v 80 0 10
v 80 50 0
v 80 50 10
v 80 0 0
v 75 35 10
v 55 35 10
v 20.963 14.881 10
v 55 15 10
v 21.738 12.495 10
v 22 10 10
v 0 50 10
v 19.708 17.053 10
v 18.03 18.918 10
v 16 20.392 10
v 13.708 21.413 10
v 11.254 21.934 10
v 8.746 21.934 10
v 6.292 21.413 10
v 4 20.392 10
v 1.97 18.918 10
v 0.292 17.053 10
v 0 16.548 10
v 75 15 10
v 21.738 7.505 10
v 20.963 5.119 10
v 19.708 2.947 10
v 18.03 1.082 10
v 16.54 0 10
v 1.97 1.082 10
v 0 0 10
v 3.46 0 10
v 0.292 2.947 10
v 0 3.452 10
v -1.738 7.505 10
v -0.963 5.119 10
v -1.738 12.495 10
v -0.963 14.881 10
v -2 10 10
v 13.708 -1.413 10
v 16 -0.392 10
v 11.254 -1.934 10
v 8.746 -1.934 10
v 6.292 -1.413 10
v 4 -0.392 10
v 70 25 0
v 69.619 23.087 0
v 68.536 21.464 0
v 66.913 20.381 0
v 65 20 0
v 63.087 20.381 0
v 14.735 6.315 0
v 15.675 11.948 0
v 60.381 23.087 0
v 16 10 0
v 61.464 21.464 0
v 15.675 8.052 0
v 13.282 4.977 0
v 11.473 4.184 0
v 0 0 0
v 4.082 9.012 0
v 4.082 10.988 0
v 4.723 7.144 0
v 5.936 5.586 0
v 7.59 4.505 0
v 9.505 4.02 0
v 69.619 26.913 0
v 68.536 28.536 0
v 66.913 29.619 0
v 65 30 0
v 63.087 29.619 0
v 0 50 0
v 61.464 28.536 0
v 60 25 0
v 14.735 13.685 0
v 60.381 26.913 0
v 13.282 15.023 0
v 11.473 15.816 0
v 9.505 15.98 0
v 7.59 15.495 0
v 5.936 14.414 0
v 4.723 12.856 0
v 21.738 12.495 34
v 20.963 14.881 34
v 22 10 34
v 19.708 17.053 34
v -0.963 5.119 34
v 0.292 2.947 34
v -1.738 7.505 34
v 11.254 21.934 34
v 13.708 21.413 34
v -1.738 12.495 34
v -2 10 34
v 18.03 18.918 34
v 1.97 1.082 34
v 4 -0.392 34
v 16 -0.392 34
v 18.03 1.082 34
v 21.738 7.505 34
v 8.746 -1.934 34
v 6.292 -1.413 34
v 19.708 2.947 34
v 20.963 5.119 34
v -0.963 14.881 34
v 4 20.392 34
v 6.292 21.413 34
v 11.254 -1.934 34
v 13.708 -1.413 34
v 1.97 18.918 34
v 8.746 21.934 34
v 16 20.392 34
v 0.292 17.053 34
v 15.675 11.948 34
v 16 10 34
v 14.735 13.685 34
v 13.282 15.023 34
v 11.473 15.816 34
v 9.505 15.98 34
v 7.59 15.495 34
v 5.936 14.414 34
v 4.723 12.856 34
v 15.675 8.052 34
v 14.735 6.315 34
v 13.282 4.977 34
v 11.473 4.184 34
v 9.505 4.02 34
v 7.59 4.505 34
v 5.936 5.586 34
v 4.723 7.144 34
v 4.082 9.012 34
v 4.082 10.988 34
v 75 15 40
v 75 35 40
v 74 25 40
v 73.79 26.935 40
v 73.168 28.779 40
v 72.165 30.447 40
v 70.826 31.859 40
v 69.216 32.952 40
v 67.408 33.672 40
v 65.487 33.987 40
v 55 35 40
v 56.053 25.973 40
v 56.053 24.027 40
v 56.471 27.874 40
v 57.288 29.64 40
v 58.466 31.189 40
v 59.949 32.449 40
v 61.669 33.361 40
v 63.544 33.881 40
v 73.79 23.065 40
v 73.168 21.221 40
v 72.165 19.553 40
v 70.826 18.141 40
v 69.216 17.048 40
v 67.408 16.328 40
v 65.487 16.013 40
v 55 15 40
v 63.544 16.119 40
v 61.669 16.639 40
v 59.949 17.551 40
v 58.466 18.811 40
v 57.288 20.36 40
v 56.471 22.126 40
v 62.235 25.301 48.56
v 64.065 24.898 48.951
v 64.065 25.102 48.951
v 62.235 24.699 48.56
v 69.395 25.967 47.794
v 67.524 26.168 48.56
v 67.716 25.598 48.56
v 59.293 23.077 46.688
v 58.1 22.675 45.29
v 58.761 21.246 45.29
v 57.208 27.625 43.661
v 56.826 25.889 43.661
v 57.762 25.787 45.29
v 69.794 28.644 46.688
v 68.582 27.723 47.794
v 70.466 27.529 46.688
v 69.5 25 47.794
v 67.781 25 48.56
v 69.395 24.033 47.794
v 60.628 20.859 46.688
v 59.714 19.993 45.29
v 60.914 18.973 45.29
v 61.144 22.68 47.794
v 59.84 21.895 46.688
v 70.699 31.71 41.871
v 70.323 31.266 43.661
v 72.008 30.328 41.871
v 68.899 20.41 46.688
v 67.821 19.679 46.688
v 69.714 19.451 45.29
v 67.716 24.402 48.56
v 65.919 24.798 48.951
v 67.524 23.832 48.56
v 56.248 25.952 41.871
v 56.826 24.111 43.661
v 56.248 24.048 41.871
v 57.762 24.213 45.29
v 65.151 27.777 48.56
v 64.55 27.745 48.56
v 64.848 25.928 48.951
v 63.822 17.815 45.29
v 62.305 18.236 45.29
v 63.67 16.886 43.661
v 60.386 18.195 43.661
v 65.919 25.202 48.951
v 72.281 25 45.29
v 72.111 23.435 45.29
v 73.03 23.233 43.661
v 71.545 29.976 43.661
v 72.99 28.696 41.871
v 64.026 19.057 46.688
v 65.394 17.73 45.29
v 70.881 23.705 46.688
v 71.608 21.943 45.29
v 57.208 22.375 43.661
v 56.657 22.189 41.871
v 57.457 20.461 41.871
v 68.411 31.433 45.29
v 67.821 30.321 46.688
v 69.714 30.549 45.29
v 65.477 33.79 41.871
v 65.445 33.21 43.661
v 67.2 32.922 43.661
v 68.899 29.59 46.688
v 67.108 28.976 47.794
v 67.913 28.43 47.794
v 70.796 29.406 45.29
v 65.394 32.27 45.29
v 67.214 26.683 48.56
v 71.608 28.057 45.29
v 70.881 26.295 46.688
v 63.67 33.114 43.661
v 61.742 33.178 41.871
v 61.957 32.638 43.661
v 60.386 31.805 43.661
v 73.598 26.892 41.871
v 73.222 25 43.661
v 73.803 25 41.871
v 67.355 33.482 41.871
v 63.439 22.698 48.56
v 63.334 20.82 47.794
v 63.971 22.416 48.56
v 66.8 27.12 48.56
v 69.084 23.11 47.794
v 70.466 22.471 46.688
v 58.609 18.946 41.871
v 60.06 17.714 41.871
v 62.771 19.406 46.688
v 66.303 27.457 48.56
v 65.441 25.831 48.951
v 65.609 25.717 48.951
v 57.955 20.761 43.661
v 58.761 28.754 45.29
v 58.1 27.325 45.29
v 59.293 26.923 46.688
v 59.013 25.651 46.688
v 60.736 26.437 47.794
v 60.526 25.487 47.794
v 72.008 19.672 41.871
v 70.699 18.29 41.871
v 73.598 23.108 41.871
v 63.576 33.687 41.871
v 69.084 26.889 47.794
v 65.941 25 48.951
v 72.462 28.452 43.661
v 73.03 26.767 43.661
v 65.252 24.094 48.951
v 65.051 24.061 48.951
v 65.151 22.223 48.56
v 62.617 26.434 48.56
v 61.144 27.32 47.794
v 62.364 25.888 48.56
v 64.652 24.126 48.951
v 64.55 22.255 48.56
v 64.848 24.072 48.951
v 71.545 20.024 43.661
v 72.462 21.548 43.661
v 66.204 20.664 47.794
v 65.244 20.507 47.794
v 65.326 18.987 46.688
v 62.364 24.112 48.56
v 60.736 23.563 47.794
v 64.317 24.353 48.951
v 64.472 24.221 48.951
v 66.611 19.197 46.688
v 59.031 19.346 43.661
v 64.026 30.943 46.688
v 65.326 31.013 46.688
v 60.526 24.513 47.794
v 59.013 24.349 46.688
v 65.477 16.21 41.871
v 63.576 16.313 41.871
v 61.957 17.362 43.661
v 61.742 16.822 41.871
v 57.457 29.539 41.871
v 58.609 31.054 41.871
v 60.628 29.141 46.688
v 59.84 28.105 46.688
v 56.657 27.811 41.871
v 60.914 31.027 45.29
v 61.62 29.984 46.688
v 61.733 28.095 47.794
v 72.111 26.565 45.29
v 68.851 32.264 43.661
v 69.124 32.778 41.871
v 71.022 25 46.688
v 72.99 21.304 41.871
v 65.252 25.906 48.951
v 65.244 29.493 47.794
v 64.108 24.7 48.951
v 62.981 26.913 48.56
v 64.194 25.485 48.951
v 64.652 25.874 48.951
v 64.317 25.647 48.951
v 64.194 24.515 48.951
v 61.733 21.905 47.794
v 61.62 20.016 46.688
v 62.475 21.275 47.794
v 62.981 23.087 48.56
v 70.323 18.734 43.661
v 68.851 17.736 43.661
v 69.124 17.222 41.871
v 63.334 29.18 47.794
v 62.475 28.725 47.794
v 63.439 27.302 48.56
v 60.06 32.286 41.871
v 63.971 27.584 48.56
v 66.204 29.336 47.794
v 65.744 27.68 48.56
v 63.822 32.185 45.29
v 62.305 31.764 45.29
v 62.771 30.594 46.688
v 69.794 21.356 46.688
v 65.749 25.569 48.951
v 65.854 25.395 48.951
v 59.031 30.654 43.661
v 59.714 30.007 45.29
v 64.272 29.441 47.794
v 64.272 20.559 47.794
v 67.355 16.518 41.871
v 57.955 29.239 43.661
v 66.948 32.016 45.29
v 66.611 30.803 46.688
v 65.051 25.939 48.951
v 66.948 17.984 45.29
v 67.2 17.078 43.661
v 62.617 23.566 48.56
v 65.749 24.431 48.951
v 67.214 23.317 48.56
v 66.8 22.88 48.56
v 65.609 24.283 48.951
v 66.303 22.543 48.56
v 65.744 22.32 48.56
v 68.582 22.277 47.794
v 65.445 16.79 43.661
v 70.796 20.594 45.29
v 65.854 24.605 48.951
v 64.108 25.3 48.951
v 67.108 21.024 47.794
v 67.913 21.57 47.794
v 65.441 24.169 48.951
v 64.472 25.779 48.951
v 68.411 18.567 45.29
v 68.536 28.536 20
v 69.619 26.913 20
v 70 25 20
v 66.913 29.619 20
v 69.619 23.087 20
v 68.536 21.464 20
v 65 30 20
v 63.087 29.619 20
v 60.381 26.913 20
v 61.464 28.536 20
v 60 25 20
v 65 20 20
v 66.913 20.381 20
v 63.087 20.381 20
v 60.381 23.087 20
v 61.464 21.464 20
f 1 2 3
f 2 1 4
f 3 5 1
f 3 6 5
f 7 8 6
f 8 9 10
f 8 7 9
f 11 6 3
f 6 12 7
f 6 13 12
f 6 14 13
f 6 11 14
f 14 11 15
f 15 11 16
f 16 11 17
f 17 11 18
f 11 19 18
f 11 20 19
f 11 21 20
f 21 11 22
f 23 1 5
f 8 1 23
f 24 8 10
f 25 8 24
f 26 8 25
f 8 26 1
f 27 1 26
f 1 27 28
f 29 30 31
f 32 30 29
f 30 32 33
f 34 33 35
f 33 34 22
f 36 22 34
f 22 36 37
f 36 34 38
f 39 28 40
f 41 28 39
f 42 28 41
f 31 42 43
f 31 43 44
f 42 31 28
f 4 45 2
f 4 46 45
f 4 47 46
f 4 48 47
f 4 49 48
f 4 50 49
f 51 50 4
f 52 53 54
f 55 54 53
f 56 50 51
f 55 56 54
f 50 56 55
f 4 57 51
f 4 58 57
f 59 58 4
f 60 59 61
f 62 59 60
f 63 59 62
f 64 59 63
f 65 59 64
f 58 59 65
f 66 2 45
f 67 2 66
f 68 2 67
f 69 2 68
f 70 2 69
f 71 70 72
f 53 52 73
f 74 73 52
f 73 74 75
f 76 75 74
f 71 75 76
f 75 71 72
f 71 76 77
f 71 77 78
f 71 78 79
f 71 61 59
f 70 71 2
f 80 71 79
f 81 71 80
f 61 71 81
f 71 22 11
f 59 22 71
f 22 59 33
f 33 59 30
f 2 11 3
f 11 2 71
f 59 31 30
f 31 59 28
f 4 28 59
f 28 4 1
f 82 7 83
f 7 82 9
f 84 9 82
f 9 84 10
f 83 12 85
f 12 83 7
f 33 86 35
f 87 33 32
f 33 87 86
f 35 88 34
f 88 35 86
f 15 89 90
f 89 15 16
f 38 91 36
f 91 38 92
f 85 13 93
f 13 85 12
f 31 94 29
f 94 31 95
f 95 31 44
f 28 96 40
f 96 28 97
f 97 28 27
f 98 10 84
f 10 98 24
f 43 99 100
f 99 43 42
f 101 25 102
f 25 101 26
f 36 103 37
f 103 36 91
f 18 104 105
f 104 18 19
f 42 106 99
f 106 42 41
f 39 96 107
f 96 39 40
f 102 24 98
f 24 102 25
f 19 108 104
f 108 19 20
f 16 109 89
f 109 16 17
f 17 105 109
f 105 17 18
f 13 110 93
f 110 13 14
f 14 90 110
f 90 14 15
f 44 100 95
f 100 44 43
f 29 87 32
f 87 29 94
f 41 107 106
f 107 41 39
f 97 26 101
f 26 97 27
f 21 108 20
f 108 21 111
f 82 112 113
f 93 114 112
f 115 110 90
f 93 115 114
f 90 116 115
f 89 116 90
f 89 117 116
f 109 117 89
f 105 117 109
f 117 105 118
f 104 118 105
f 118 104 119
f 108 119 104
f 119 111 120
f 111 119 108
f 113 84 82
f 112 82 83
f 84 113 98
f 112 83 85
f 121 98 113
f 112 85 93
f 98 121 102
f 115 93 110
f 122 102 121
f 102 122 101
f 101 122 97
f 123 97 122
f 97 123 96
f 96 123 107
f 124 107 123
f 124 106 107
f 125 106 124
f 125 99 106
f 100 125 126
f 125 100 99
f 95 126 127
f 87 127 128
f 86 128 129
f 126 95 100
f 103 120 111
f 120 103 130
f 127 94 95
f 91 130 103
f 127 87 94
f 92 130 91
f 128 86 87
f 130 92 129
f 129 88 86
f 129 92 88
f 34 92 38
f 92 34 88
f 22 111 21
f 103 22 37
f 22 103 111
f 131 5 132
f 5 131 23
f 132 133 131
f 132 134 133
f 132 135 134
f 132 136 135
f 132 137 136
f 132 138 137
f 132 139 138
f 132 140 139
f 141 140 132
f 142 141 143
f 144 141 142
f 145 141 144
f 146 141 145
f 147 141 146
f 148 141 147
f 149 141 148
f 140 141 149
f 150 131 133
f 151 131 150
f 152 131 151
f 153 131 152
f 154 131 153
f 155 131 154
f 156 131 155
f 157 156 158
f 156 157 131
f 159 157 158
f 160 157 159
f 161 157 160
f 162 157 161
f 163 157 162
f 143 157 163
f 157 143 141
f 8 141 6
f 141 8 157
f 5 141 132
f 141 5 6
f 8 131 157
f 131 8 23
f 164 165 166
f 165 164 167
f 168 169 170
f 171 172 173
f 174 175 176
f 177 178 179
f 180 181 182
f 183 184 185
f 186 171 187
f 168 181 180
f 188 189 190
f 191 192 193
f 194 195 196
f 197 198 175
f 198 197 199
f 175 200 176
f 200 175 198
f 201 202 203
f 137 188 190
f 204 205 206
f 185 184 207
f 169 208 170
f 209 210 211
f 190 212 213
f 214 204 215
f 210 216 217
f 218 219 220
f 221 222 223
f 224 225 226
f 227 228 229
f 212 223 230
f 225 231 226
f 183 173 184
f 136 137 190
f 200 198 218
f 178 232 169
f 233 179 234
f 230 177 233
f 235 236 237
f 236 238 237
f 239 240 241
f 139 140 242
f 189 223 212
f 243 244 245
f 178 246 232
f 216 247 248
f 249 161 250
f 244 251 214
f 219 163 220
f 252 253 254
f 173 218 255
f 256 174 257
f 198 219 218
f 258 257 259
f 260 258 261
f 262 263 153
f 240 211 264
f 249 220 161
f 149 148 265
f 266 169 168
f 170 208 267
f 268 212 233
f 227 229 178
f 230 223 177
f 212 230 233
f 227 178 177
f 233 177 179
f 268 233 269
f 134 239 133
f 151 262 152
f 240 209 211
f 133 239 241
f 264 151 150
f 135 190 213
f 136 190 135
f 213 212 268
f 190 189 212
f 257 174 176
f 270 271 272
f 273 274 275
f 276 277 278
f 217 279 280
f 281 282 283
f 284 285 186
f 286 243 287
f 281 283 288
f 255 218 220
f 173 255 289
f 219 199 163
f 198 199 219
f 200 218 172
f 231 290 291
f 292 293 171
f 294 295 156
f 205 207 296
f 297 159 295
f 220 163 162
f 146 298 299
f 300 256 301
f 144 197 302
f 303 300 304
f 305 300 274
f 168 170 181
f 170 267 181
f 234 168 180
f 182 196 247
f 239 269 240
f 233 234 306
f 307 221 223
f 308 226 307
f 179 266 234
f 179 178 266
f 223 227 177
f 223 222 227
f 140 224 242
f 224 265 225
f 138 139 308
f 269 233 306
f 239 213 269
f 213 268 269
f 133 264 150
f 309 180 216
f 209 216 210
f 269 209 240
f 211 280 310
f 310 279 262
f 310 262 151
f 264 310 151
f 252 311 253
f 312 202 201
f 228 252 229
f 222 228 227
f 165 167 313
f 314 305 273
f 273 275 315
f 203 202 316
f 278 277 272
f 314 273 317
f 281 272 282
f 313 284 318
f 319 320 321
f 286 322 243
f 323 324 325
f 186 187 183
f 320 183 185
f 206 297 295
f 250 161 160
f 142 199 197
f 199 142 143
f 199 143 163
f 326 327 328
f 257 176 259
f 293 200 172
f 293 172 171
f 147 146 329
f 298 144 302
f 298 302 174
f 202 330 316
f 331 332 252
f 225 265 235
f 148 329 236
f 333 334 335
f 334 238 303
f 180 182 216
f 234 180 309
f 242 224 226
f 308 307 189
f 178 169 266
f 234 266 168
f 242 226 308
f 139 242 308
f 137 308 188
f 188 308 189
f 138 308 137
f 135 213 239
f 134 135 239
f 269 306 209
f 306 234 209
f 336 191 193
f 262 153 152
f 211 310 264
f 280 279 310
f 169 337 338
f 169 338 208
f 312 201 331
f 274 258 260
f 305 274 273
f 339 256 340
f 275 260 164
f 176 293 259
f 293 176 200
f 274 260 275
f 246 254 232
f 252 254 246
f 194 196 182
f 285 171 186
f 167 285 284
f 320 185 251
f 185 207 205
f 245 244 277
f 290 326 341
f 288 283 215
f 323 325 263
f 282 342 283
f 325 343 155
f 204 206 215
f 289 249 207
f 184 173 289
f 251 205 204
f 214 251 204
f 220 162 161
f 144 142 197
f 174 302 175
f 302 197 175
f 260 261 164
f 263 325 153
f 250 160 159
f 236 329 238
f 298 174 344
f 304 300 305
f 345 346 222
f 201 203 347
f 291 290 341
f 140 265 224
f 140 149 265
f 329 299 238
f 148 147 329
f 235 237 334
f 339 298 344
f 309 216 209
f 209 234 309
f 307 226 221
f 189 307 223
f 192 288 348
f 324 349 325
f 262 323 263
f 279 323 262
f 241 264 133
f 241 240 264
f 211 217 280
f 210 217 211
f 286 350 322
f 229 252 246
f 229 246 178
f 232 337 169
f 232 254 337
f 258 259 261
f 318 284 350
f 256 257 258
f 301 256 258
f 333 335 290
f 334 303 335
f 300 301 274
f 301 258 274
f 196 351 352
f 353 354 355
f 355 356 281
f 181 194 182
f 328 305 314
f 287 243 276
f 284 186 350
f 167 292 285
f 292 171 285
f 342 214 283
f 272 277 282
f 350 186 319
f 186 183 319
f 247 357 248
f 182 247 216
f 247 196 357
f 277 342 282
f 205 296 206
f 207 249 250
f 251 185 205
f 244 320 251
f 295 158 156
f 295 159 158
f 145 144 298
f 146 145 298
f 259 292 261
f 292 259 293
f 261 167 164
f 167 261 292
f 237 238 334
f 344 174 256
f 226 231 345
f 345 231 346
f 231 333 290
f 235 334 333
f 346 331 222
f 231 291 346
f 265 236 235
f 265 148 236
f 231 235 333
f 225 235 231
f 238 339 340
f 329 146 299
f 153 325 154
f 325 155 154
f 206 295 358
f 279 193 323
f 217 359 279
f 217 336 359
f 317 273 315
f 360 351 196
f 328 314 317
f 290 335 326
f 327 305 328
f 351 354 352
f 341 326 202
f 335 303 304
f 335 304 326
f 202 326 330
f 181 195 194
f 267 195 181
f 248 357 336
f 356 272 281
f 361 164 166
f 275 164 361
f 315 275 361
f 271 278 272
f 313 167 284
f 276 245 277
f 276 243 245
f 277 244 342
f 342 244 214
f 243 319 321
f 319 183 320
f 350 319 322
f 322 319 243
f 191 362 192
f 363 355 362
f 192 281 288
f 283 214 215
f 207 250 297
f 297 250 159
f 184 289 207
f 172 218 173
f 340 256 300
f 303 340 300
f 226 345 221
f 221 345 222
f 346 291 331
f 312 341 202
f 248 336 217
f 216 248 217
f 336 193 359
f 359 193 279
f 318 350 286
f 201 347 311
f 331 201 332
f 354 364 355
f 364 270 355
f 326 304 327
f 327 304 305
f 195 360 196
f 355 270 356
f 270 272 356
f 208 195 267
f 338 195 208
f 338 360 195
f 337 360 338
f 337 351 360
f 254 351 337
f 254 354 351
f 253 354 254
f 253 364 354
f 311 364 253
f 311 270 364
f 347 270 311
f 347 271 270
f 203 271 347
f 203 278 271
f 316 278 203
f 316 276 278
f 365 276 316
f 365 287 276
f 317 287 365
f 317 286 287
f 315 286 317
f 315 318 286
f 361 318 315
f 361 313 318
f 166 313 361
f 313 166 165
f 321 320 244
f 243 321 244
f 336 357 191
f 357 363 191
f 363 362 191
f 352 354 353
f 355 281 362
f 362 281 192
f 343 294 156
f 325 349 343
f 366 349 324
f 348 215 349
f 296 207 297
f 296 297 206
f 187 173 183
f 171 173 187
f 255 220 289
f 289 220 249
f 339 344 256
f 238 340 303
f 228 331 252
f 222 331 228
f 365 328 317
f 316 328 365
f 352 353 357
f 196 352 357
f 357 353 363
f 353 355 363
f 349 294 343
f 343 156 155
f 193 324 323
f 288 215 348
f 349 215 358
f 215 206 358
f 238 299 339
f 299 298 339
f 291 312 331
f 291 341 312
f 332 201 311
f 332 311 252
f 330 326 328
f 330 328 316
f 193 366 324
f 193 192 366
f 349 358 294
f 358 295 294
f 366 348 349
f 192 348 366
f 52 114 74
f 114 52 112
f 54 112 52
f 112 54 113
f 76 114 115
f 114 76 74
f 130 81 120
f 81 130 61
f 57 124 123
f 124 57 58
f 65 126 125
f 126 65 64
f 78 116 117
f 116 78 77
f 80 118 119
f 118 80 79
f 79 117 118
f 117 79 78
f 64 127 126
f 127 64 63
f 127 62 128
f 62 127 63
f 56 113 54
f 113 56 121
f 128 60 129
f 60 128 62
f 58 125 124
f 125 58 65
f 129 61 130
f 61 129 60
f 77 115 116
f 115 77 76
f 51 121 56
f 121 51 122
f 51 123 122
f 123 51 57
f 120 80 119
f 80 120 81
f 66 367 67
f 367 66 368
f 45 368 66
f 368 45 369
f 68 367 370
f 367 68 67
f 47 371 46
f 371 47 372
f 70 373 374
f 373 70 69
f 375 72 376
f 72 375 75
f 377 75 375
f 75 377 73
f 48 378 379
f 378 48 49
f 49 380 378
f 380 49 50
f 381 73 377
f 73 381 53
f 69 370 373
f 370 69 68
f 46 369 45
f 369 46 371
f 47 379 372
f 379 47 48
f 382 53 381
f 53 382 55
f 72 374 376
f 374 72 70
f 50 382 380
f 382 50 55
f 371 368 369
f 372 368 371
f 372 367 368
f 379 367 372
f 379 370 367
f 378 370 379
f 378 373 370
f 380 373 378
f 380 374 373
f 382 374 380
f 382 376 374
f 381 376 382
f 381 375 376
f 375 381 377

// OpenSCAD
// MyCAD sample: the subset of OpenSCAD the importer understands.
// A base plate with a boss and a post, with two bores taken back out.
difference(){
  union(){
    cube([80,50,10]);
    translate([10,10,10]) cylinder(h=24, r=12);
    translate([55,15,10]) cube([20,20,30]);
    translate([65,25,40]) sphere(9);
  }
  translate([10,10,0]) cylinder(h=40, r=6);
  translate([65,25,0]) cylinder(h=20, r=5);
}
